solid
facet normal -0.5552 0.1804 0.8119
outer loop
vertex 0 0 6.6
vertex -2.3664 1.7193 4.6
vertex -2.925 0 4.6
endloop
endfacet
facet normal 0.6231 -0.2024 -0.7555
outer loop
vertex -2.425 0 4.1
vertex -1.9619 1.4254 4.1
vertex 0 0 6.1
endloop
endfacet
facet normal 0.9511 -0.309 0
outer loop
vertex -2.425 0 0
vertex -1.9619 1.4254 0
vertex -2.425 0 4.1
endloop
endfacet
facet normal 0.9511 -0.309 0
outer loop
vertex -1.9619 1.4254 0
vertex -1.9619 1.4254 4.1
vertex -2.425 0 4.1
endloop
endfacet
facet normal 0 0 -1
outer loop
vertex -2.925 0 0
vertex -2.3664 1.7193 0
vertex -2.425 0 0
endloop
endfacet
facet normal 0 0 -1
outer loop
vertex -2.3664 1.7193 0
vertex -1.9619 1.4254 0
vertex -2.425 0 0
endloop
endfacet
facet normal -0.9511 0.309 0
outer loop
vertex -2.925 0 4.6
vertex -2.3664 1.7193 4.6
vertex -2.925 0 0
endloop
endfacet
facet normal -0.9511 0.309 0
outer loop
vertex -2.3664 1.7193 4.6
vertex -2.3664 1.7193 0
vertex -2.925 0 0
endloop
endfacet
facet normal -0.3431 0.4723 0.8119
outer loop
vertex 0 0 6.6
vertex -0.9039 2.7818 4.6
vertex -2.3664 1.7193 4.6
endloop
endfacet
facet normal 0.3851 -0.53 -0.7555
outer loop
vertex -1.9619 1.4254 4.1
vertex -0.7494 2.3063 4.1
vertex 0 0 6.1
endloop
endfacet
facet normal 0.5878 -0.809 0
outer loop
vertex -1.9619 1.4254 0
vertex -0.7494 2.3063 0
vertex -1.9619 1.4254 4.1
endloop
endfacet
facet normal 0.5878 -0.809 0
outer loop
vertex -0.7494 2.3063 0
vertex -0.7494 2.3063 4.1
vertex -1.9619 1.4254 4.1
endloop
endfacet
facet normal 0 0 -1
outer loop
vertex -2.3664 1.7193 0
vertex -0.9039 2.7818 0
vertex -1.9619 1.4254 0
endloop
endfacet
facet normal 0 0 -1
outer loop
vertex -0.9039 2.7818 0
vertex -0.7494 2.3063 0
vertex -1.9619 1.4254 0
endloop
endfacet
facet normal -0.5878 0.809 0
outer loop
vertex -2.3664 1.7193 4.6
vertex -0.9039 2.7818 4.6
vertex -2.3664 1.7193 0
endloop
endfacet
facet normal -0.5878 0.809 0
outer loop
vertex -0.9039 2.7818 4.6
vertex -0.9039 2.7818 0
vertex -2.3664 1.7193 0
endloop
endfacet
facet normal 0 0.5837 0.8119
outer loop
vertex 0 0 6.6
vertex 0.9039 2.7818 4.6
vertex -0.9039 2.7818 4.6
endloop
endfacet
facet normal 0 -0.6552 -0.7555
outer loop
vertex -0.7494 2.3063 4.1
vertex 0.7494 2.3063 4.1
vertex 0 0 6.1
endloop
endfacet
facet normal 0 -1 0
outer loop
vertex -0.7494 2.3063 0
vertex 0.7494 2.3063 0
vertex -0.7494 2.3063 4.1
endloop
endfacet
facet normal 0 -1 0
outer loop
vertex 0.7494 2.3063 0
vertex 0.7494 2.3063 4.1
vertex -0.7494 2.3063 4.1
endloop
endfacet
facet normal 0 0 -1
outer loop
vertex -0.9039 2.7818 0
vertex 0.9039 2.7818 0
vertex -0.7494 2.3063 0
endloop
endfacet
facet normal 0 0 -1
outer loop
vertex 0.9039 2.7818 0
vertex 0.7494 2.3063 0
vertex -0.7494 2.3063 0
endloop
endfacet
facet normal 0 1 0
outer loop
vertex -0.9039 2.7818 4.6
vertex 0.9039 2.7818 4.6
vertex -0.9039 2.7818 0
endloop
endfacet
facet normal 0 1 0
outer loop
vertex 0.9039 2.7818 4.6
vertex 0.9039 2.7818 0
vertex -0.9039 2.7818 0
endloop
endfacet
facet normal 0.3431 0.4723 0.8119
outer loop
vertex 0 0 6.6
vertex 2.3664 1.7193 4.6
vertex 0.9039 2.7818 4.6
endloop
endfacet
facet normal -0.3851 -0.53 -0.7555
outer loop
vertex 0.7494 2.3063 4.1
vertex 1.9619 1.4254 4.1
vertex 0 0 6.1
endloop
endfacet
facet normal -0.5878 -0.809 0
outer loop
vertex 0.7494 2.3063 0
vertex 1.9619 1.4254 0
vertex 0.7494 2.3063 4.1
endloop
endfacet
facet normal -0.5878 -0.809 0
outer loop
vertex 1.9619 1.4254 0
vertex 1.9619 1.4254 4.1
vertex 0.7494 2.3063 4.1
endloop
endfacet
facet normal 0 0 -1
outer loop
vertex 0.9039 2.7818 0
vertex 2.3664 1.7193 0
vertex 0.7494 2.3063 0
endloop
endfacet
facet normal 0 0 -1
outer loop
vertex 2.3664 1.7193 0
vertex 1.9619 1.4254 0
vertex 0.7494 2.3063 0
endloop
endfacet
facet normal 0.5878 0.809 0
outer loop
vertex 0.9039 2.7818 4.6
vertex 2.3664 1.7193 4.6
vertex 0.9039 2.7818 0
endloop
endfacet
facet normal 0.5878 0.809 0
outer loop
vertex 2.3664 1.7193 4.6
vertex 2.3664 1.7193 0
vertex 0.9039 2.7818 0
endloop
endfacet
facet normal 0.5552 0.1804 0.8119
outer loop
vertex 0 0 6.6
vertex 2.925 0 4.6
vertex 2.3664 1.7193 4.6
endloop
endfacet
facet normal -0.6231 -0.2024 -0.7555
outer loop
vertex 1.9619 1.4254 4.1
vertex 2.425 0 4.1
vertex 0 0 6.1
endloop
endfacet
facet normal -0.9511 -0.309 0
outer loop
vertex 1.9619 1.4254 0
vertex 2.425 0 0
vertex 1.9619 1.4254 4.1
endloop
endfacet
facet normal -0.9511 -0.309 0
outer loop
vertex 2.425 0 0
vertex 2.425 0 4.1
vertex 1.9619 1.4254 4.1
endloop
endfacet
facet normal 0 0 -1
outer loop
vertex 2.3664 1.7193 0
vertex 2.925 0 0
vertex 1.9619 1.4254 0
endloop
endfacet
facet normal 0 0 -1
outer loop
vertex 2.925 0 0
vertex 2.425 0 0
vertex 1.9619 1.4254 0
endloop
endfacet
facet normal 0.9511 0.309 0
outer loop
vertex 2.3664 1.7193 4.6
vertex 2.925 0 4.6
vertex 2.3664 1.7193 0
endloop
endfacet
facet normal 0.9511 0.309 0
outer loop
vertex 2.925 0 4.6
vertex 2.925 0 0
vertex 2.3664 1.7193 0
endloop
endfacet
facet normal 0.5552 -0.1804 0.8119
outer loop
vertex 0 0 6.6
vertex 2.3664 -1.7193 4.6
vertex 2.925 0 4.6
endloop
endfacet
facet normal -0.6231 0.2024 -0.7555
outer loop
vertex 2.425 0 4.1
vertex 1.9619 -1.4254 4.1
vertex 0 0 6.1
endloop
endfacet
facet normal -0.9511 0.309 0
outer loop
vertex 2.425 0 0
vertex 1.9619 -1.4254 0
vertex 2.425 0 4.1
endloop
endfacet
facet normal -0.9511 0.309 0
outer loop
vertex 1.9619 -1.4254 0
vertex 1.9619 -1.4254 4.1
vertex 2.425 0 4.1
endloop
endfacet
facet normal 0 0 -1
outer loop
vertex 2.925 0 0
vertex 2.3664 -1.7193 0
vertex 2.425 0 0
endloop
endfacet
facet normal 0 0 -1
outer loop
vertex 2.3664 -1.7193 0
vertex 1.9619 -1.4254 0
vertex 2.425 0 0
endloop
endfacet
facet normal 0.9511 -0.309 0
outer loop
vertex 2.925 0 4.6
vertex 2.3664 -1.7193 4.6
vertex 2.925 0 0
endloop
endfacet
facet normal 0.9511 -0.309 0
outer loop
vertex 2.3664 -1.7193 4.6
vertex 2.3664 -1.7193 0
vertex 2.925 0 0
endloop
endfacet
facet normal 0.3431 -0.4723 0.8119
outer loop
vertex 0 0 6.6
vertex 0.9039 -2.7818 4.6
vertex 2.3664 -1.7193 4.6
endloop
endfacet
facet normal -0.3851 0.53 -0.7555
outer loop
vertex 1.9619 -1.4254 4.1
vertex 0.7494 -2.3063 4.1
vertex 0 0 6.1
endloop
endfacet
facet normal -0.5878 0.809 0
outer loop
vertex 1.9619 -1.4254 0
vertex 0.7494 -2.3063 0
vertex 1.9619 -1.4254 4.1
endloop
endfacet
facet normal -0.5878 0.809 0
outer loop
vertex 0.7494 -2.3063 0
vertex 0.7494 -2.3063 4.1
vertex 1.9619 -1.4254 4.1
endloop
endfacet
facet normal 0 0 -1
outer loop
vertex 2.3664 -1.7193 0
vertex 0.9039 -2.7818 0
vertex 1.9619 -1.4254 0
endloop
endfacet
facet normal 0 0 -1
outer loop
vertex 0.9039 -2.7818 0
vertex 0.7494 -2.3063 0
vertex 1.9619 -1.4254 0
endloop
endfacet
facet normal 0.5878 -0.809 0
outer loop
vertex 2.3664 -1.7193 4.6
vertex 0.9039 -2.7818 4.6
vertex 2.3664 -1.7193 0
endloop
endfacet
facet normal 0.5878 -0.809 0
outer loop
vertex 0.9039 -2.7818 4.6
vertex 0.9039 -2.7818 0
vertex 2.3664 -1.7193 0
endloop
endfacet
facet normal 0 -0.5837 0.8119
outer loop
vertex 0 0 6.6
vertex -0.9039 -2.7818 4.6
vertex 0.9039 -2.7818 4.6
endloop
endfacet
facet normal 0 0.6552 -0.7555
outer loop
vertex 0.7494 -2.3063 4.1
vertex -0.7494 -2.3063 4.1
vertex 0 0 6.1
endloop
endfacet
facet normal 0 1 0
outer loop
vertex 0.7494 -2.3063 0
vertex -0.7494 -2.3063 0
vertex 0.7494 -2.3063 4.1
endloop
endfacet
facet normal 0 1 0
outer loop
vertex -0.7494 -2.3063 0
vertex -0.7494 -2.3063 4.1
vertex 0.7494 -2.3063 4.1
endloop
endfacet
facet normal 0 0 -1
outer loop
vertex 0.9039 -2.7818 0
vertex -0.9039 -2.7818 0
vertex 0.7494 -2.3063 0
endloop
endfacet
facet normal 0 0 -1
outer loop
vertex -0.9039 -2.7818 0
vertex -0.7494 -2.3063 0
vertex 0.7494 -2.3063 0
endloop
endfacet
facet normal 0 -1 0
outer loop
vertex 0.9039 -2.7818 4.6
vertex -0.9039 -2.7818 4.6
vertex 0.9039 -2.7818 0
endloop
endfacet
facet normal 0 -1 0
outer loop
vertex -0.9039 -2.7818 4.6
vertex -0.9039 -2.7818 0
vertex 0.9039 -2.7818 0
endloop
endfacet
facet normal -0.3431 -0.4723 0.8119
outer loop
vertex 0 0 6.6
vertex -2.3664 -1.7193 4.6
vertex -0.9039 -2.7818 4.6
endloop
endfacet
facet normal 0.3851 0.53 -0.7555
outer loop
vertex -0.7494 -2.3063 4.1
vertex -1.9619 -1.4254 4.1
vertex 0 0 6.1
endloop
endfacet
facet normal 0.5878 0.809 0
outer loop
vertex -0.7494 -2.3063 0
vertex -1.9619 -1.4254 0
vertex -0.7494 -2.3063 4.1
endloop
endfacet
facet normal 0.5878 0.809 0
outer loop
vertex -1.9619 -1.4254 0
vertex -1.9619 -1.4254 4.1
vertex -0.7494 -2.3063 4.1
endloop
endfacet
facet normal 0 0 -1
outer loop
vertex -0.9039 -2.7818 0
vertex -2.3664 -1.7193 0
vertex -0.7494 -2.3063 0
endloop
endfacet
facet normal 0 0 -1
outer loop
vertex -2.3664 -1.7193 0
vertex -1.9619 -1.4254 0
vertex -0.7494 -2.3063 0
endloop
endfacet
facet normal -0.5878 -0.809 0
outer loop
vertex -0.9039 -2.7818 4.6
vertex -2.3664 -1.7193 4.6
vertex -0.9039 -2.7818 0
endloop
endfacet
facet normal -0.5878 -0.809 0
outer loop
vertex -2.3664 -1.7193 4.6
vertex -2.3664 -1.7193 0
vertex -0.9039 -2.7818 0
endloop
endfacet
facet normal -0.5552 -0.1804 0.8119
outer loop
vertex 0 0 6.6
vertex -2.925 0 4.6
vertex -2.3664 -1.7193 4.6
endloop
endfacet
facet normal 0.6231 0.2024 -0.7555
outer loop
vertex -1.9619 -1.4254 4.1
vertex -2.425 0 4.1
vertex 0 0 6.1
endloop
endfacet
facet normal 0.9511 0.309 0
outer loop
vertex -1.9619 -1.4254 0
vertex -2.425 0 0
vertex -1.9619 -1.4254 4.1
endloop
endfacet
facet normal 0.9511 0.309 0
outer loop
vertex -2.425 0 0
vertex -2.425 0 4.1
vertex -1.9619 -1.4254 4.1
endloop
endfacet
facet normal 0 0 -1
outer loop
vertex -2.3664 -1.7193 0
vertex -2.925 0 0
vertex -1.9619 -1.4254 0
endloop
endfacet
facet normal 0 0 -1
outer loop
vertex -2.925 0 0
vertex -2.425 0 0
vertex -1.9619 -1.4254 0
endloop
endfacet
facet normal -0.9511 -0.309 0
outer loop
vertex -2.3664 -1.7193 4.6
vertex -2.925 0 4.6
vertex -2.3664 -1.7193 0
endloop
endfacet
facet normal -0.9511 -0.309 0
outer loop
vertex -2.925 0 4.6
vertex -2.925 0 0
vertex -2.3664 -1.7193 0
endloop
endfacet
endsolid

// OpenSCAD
function led_diameter() = 4.85; // mm
function led_height() = 4.10;
function wall_thickness() = 0.5;
function top_slope() = 2.0; // give the top a little slope, makes it easier to print without support

module led_ballon_light_softener() {
    led_r = led_diameter() / 2;

    rotate_extrude()
    polygon(
        points = [
            [led_r, 0],
            [led_r, led_height()],
            [0, led_height() + top_slope()],
            [0, led_height() + wall_thickness() + top_slope()],
            [led_r + wall_thickness(), led_height() + wall_thickness()],
            [led_r + wall_thickness(), 0]
        ]
    );
}

led_ballon_light_softener();
